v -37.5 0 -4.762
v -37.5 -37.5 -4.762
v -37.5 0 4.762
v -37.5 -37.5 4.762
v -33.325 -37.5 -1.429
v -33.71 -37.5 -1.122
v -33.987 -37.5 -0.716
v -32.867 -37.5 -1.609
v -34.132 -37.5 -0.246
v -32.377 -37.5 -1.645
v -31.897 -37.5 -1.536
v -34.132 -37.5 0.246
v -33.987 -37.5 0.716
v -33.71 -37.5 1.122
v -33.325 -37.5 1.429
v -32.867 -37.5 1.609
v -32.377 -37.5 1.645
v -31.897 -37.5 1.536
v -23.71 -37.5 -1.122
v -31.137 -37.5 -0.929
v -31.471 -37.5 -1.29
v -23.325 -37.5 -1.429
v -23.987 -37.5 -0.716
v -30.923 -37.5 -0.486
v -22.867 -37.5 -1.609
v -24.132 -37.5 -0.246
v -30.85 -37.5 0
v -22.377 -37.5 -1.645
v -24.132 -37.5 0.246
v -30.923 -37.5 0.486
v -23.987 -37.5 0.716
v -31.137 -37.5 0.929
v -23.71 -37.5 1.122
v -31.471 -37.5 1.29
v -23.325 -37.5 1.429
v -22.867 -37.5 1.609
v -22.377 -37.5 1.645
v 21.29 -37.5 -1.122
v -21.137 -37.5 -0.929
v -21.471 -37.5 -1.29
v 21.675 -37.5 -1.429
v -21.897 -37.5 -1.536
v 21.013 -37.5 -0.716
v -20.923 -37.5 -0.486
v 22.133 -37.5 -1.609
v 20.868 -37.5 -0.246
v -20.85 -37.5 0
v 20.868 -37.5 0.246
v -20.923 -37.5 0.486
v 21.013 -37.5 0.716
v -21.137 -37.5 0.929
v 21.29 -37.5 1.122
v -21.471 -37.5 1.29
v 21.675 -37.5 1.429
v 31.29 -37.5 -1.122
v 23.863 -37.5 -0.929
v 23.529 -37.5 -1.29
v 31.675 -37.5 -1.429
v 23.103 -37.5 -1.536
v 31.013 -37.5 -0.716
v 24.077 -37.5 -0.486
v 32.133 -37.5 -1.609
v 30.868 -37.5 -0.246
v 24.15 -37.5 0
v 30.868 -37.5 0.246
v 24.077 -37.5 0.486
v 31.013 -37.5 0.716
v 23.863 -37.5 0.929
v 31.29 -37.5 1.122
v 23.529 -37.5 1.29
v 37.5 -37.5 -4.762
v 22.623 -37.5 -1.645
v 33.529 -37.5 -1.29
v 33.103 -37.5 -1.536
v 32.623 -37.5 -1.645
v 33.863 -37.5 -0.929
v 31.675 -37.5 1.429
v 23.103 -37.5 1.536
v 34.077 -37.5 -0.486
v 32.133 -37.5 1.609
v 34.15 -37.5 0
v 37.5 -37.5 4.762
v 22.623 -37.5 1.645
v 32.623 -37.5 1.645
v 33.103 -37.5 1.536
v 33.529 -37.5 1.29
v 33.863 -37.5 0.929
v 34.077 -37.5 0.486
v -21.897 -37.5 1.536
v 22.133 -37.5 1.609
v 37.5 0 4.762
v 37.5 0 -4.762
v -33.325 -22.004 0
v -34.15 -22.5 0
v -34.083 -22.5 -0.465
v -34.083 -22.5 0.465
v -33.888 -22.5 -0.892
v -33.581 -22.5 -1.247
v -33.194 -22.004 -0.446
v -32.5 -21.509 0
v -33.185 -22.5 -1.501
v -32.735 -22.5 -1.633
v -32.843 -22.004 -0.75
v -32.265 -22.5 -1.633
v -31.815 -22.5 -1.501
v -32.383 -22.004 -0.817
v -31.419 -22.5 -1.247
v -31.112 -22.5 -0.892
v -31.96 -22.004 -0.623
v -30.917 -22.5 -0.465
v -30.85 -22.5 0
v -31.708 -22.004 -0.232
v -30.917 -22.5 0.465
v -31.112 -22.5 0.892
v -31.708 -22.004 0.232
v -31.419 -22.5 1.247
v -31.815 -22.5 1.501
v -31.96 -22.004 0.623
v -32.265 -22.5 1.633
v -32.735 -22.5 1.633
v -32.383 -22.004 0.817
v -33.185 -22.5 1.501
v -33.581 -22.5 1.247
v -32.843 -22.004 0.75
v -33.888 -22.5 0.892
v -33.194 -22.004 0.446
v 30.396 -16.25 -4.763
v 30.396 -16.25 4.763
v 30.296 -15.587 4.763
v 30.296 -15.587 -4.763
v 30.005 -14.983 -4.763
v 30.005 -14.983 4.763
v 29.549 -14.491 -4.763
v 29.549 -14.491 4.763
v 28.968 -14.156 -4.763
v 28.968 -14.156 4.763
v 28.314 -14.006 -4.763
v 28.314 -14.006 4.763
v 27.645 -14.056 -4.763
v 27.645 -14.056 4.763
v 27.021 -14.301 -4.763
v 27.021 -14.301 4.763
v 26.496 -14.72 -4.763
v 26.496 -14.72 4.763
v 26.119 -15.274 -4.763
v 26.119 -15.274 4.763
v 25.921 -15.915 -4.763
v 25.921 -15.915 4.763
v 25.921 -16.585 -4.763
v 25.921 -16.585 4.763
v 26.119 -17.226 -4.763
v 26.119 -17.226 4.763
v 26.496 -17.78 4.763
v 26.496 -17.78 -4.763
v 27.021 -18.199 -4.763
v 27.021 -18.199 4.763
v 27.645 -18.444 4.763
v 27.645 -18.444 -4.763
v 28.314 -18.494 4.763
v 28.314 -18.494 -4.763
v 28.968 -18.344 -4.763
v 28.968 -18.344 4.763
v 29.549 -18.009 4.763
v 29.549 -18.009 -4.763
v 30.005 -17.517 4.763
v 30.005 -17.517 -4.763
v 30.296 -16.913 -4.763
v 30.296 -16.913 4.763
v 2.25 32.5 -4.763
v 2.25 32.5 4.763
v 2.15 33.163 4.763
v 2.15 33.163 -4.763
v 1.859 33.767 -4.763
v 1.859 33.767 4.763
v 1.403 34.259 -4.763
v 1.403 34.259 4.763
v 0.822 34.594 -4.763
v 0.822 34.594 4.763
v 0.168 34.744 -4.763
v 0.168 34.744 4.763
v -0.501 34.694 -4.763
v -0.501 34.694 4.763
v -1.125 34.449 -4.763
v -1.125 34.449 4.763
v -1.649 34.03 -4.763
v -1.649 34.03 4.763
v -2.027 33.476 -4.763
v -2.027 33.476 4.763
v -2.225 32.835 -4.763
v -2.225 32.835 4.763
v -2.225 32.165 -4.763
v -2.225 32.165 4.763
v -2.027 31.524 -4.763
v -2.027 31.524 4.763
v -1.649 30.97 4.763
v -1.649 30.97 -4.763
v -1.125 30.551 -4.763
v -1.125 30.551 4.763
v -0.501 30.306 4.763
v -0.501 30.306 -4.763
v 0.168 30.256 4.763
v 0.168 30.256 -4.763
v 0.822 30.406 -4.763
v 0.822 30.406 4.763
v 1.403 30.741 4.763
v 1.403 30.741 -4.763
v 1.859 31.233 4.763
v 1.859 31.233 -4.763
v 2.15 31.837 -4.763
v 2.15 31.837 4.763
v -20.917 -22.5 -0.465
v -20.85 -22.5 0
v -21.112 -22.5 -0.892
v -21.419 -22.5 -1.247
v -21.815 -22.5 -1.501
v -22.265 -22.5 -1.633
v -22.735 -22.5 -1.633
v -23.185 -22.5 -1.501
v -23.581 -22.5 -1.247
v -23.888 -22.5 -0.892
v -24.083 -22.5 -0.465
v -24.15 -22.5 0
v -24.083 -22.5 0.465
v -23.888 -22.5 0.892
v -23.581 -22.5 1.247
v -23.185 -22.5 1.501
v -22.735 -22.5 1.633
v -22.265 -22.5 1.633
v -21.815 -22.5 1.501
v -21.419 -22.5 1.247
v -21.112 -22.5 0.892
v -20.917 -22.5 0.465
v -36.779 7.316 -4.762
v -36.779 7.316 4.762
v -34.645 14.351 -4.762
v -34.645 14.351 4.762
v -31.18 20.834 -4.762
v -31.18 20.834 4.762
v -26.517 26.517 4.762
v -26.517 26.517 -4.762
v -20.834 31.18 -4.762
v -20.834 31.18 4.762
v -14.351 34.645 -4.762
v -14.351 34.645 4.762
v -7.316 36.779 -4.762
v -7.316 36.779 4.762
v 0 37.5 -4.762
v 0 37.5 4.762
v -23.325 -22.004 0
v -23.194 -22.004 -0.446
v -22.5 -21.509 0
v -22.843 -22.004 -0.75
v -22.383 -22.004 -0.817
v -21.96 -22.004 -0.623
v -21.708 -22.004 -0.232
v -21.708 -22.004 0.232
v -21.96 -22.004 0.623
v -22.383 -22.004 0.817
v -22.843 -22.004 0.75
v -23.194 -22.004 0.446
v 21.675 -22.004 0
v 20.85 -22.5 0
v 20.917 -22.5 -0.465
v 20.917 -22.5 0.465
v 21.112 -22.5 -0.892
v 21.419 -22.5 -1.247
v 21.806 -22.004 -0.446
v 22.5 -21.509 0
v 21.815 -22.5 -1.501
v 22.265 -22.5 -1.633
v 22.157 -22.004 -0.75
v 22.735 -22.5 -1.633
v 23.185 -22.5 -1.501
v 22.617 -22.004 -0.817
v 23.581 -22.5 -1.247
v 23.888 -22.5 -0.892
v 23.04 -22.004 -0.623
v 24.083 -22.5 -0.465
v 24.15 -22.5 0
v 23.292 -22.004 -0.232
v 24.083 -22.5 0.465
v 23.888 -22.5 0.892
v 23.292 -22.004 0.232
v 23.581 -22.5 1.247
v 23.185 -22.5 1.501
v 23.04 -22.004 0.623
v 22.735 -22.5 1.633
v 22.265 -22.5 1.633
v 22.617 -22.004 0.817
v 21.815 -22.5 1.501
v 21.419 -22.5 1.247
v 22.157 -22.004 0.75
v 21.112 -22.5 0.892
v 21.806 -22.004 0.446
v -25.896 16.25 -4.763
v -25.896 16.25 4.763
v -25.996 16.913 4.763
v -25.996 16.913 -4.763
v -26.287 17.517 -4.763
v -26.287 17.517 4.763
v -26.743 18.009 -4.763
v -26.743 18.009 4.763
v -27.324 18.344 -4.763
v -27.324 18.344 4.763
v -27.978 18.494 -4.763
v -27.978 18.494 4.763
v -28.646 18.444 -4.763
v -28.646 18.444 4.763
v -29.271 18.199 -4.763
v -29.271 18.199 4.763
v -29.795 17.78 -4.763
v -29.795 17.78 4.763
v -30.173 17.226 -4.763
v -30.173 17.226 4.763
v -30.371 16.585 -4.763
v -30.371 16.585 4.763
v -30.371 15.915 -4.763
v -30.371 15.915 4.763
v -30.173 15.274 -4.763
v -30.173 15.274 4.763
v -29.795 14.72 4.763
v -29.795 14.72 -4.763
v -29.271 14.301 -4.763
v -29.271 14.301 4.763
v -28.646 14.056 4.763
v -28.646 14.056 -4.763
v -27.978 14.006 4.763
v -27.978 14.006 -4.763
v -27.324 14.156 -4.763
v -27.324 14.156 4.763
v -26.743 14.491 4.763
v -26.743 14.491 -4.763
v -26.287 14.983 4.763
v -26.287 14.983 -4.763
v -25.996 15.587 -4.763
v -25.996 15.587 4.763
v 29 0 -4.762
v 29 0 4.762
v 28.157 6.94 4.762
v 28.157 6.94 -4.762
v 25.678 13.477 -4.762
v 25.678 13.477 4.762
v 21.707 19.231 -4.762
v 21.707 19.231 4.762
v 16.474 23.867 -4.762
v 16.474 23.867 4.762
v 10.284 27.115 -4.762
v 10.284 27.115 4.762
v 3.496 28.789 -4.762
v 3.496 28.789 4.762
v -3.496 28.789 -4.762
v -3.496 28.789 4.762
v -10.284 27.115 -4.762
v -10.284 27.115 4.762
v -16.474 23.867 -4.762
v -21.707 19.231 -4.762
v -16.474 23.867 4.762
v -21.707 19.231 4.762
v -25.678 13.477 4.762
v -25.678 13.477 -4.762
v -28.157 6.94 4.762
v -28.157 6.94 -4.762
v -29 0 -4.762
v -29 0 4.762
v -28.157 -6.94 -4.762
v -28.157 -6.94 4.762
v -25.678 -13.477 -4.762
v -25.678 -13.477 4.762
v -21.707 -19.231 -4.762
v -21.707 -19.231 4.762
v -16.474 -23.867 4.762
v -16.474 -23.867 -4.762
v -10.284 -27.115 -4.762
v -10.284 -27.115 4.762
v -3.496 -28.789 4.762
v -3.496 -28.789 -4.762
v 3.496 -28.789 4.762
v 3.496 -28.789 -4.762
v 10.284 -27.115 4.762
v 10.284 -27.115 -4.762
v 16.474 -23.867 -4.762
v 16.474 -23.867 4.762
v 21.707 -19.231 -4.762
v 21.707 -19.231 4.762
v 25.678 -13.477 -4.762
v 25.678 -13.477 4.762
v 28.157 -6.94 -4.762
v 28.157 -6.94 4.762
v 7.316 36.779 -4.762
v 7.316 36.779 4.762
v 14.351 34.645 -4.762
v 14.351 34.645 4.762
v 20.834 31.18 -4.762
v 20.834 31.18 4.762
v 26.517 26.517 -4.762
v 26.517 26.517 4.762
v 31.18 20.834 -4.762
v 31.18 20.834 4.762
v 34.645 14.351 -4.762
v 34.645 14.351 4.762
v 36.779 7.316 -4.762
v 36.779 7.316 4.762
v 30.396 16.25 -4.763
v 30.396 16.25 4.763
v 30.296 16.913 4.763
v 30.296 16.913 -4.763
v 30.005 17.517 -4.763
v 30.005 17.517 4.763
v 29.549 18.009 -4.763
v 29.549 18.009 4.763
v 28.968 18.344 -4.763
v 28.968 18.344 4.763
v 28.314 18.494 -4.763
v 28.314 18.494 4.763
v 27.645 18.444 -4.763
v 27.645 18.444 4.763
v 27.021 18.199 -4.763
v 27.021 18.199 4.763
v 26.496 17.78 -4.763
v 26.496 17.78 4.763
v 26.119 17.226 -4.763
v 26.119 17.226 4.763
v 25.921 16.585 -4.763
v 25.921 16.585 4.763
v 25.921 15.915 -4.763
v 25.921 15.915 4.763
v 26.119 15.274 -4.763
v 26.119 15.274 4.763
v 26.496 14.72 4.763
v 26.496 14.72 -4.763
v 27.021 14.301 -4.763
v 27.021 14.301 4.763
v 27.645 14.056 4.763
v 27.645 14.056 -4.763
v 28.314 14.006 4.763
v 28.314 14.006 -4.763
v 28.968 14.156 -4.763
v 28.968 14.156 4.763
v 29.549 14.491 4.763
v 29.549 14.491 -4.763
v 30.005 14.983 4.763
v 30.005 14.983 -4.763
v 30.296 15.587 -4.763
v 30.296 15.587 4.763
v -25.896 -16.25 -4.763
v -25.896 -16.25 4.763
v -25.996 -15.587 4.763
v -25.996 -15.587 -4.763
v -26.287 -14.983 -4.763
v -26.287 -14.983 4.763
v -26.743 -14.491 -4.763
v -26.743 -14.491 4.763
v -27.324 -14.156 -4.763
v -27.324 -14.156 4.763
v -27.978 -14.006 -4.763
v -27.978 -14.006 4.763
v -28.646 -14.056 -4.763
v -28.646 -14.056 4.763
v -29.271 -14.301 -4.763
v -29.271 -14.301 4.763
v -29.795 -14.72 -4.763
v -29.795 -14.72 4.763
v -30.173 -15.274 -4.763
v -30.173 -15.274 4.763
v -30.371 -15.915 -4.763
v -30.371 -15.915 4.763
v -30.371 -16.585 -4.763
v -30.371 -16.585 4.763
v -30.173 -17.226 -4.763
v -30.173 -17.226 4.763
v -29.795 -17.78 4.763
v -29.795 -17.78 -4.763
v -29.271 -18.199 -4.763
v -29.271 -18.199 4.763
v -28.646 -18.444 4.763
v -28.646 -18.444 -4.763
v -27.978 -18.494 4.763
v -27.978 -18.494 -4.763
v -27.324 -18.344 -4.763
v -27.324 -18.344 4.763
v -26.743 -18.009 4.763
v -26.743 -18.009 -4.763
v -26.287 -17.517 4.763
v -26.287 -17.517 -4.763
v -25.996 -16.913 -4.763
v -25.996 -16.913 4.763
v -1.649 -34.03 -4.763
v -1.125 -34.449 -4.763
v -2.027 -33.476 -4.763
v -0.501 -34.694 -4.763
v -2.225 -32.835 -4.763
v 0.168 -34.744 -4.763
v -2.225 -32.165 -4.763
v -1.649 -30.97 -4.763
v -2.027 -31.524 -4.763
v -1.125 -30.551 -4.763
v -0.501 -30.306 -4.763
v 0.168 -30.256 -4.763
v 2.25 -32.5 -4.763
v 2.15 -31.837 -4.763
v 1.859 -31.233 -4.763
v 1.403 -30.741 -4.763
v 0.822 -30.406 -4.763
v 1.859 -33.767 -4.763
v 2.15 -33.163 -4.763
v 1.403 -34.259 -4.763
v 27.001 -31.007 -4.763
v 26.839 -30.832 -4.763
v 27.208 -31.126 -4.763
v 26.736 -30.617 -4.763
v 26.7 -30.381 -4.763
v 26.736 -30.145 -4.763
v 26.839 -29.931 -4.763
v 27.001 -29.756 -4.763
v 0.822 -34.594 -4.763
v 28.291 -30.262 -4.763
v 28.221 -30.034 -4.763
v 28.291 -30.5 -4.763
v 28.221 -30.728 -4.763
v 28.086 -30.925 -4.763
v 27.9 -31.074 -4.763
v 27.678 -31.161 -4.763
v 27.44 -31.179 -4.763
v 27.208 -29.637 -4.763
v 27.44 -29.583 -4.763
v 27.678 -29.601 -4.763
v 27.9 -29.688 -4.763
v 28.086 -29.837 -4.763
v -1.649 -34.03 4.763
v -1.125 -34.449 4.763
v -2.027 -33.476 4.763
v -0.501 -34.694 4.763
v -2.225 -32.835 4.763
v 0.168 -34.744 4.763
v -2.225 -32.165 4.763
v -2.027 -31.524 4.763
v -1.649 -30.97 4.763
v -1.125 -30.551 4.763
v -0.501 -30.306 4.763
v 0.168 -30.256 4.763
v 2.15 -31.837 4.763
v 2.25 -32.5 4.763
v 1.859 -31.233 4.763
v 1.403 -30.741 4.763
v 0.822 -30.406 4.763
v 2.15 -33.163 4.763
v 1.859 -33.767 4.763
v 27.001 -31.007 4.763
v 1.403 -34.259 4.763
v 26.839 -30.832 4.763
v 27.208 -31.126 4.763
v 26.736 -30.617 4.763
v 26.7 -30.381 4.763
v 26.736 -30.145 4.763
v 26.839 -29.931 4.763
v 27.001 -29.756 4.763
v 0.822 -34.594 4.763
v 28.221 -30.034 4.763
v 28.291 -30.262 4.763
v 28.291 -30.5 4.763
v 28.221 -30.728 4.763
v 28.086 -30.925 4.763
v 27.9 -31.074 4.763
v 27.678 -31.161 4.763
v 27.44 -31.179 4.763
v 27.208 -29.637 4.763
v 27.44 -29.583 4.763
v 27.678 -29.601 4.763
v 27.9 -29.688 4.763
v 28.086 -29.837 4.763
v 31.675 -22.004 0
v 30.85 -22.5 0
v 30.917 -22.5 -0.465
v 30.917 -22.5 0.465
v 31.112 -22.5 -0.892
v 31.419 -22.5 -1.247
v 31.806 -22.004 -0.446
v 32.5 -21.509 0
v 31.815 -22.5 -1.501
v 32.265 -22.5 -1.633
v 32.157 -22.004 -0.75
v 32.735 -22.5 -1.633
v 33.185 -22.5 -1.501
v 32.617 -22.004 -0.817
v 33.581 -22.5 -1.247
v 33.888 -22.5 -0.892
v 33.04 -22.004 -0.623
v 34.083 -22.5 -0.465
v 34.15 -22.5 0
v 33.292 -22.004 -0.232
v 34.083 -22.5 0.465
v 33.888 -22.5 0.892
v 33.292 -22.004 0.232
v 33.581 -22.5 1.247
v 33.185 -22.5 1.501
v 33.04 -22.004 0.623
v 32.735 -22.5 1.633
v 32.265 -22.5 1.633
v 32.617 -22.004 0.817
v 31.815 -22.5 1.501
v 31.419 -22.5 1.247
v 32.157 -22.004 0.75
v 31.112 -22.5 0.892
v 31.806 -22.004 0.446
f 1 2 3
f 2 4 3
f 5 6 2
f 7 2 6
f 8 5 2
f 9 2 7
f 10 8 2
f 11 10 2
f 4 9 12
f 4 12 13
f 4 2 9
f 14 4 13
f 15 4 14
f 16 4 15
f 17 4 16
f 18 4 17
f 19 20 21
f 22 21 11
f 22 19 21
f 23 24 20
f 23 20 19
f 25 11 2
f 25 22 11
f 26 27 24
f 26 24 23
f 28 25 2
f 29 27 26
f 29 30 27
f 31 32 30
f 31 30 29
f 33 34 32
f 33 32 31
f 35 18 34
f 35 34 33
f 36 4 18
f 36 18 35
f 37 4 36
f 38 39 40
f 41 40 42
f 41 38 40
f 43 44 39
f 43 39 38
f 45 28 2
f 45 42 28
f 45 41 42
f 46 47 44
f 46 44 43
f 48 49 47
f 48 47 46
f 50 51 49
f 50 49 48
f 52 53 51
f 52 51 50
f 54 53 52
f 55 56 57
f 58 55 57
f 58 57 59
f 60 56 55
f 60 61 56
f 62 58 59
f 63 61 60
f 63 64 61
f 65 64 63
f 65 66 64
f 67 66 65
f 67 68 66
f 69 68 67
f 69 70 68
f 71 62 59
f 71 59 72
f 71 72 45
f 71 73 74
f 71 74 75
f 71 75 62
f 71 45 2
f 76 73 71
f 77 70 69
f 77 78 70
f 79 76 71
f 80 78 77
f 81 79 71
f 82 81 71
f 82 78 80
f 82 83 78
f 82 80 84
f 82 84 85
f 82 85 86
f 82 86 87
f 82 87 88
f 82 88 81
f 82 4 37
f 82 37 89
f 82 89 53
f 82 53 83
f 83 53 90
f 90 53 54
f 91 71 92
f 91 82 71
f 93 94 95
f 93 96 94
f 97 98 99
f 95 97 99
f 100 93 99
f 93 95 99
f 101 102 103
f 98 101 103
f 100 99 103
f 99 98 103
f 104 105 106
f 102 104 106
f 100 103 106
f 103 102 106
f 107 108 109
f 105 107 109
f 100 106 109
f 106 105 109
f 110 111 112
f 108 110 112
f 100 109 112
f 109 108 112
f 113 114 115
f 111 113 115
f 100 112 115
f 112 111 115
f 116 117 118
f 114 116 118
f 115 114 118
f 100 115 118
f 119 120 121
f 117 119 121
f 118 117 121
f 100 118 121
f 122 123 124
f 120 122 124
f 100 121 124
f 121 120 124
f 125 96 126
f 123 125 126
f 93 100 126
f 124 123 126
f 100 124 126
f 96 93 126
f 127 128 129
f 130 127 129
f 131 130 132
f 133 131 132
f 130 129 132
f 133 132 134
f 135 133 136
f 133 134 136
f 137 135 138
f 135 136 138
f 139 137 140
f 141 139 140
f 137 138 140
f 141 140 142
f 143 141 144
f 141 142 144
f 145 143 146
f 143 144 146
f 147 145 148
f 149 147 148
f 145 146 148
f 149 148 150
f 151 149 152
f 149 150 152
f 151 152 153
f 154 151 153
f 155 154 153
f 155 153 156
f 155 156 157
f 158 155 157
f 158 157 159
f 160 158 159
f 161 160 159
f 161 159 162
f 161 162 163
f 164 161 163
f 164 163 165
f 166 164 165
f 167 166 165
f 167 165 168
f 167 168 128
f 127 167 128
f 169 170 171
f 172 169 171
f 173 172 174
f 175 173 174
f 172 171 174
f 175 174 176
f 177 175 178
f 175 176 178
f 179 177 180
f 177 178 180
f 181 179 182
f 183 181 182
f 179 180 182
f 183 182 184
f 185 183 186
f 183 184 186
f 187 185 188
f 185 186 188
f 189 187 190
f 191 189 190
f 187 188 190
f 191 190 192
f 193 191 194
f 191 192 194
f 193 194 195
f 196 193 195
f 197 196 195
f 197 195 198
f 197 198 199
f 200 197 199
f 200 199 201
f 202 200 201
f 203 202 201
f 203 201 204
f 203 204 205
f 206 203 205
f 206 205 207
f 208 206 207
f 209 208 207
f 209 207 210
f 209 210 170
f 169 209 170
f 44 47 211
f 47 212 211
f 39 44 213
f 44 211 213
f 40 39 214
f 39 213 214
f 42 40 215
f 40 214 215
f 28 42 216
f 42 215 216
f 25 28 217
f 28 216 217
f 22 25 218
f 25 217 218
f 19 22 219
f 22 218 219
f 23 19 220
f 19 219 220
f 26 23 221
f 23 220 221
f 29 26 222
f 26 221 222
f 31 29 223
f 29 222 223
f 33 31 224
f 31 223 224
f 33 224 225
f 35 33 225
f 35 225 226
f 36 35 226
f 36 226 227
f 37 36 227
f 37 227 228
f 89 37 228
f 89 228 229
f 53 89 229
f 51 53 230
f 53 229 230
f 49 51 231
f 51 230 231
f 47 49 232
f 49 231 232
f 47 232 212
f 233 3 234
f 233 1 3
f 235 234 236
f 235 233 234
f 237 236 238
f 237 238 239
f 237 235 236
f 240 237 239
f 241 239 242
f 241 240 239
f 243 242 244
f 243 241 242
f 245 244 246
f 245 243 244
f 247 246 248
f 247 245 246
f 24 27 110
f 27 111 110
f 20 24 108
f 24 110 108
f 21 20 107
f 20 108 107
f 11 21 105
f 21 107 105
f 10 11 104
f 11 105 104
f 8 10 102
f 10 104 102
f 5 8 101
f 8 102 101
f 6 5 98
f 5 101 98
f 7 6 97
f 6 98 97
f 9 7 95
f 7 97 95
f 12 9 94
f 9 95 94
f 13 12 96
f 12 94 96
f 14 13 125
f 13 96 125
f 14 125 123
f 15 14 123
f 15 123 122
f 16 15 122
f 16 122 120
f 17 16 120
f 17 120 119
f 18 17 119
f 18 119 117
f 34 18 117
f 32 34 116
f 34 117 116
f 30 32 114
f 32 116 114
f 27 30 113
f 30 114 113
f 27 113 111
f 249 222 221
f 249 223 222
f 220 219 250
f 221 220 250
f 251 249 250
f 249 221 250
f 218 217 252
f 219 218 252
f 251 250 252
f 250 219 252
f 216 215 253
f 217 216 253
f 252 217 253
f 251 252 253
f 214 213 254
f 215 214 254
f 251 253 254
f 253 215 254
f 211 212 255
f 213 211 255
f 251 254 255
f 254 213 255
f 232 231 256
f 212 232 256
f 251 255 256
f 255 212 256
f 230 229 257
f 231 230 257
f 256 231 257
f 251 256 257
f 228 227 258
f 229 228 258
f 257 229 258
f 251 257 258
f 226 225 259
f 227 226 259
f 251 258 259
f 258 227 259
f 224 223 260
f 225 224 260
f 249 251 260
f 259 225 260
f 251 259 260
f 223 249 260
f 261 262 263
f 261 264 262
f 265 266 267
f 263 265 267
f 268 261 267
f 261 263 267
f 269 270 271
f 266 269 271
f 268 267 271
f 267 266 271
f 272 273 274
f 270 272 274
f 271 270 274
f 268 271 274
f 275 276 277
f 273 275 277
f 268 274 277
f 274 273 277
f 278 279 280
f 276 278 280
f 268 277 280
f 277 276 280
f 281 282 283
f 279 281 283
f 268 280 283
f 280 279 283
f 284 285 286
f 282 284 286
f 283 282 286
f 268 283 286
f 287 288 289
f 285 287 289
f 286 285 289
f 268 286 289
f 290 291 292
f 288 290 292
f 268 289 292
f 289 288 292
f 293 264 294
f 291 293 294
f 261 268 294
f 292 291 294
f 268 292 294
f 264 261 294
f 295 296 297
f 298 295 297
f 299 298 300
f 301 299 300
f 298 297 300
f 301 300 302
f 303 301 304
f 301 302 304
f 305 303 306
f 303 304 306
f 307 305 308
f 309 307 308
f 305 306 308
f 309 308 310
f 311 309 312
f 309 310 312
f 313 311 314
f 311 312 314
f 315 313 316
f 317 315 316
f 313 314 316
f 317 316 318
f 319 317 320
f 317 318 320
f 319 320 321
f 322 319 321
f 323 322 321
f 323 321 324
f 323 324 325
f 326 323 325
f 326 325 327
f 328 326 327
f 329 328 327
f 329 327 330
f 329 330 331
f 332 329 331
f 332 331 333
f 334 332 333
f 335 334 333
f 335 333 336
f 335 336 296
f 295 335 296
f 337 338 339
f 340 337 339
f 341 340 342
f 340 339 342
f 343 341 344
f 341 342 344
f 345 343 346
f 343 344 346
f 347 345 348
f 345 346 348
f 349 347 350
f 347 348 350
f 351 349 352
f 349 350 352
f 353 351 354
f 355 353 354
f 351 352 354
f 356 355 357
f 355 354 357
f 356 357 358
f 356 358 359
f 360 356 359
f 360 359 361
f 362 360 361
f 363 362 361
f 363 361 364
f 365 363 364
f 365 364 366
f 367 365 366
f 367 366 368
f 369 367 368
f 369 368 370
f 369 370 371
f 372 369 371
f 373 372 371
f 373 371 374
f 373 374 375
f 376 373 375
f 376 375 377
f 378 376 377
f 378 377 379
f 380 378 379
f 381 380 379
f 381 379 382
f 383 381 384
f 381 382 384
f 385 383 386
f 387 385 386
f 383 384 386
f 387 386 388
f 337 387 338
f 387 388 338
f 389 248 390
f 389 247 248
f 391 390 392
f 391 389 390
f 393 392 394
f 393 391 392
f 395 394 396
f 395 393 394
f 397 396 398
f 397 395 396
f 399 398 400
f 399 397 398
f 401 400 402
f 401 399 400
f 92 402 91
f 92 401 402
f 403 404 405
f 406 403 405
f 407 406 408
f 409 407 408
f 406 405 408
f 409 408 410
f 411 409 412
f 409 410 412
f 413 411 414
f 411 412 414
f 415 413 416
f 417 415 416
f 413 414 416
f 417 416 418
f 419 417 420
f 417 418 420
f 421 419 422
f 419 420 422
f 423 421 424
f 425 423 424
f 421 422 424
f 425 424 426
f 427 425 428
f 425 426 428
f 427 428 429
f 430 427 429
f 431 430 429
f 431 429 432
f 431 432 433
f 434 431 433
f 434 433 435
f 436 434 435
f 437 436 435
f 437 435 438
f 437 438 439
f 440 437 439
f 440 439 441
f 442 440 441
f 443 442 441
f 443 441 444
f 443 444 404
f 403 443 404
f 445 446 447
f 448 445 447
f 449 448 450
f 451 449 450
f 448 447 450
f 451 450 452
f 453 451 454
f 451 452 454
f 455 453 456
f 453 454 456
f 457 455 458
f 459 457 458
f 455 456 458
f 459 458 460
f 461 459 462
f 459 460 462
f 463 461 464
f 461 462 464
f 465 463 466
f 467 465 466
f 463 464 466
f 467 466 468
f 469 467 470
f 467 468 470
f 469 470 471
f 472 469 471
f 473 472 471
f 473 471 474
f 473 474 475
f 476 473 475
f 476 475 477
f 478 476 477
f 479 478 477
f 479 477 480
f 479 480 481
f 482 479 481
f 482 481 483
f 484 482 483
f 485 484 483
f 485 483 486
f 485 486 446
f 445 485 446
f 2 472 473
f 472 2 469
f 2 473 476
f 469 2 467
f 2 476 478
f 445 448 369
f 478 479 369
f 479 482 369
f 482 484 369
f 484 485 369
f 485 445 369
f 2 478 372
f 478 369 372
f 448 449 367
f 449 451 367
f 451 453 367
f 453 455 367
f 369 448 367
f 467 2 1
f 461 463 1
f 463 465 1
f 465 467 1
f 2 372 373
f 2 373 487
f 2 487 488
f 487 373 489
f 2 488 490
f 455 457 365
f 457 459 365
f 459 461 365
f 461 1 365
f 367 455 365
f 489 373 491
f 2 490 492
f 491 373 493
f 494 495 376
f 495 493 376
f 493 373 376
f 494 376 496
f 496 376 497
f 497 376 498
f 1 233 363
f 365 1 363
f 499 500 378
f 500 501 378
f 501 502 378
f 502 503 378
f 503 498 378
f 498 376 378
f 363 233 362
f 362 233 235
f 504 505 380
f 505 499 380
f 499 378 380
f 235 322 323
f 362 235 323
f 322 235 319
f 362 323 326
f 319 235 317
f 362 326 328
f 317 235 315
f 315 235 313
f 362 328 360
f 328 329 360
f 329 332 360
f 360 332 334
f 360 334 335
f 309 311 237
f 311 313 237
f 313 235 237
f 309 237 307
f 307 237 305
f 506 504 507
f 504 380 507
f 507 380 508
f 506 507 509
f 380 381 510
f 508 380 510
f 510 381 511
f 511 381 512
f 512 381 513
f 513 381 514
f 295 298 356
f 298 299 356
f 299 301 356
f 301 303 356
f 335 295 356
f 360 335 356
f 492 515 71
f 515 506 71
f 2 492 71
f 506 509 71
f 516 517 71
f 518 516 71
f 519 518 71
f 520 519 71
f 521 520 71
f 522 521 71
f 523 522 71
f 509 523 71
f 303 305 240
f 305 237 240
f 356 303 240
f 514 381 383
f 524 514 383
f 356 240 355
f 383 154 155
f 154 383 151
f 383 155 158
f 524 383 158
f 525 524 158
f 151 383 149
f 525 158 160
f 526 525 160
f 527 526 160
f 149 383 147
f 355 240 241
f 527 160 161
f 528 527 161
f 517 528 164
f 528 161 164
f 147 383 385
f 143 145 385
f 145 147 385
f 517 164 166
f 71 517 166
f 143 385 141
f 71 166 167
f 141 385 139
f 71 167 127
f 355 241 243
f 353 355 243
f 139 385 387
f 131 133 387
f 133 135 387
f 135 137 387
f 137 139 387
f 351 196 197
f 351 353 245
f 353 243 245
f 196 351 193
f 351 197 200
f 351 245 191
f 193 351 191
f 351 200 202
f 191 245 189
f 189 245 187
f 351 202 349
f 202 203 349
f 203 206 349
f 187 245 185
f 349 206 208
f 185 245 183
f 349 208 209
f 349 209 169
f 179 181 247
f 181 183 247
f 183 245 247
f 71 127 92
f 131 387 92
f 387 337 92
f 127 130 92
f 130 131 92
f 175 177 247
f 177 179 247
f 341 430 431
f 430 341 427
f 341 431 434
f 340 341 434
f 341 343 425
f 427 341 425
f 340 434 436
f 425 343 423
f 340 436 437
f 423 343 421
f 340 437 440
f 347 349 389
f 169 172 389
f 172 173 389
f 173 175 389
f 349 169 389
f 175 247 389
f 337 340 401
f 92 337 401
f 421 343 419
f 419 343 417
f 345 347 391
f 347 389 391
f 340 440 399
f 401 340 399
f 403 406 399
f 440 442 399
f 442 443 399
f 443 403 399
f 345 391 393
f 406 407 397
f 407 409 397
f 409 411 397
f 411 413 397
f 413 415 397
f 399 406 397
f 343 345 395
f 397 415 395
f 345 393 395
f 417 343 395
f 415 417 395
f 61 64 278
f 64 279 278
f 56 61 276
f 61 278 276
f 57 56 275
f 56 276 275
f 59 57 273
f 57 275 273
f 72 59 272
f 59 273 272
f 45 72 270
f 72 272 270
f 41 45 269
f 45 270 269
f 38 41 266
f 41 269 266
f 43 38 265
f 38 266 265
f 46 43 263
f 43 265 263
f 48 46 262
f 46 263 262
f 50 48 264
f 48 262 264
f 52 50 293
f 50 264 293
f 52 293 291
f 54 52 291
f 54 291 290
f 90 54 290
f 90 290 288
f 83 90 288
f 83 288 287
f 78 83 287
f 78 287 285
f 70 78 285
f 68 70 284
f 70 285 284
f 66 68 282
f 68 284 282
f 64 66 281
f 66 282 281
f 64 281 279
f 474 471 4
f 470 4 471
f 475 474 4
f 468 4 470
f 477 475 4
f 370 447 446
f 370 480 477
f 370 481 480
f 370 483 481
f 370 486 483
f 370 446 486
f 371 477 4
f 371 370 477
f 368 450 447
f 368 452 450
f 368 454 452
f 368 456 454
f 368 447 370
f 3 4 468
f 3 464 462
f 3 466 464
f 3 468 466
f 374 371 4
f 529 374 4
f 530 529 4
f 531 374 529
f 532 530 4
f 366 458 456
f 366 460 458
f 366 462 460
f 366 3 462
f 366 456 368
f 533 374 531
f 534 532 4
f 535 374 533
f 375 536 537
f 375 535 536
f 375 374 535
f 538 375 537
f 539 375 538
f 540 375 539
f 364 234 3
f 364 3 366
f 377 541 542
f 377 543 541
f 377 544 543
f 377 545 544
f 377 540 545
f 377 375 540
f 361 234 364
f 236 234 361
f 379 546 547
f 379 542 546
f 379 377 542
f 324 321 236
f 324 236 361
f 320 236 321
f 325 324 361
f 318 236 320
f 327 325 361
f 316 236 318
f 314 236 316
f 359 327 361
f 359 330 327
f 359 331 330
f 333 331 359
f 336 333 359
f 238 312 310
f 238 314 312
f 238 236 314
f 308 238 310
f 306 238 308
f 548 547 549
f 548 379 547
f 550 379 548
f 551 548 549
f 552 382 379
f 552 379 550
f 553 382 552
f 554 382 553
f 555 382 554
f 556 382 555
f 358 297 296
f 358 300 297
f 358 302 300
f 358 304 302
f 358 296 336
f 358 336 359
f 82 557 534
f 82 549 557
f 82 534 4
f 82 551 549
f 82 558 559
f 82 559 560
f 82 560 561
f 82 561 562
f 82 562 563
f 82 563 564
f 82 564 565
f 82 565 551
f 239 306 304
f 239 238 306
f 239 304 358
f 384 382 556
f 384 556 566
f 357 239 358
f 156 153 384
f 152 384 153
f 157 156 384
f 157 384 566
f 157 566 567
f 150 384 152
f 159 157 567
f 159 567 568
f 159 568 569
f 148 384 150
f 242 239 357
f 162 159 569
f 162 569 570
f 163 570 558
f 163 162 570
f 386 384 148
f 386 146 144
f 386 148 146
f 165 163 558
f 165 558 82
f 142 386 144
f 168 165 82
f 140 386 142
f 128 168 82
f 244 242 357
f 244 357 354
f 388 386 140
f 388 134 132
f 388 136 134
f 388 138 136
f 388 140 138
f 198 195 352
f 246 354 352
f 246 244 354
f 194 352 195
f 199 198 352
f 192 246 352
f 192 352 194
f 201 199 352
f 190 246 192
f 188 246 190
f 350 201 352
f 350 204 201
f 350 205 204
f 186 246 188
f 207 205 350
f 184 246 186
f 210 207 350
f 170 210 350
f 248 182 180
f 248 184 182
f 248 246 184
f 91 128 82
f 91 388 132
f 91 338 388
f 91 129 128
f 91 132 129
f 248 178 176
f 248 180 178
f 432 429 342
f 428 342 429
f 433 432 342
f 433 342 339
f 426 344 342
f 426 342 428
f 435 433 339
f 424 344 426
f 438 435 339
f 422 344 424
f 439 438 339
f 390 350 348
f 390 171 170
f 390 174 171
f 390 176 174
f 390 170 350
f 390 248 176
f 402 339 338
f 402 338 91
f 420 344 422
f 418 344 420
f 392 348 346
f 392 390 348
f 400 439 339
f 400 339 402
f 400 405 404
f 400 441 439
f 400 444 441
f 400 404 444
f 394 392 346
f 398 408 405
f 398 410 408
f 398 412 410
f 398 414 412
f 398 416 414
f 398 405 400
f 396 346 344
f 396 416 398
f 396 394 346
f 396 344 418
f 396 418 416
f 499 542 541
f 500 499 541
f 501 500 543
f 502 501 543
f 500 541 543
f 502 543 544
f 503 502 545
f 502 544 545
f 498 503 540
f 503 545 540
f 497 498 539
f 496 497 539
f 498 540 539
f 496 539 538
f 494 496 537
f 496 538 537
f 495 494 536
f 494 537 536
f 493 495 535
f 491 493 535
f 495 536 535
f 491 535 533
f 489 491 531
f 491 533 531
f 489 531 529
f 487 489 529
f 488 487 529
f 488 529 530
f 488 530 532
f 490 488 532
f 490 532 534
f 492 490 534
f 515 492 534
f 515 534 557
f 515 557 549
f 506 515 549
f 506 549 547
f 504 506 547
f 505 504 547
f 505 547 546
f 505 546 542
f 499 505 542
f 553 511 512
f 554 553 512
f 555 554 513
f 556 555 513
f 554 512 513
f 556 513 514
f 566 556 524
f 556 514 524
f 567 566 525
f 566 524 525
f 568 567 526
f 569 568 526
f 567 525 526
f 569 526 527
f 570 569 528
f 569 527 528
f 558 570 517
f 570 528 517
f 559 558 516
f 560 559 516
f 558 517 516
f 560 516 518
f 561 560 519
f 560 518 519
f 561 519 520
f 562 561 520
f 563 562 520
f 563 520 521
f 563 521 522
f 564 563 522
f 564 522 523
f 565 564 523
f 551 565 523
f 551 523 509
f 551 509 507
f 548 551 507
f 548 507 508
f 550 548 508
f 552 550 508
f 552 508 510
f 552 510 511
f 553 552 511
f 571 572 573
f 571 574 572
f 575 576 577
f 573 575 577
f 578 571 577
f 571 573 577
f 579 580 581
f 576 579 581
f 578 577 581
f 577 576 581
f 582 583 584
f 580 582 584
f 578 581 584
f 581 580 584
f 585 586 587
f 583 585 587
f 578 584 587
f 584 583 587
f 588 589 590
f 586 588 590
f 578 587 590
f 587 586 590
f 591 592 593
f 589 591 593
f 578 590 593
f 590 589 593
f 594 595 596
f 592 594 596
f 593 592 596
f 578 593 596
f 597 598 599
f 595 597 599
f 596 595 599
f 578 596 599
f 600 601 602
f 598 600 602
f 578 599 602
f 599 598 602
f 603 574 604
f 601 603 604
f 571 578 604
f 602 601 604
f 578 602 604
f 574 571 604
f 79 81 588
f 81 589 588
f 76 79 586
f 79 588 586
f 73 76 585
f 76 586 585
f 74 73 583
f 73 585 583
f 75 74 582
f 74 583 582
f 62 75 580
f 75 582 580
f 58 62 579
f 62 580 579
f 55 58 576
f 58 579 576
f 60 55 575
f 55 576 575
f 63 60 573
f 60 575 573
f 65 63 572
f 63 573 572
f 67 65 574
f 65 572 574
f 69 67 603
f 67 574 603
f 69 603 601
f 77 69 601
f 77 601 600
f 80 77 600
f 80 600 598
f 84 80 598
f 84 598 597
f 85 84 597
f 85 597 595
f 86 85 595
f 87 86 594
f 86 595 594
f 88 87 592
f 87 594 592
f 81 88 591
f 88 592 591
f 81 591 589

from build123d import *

# Parameters (mm, degrees)
SKETCH2_W                 = 75
SKETCH2_H                 = 75
BOSS_EXTRUDE1_DEPTH       = 4.7625
M4X0_7_TAPPED_HOLE1_D     = 3.3
M4X0_7_TAPPED_HOLE1_DEPTH = 15
M4X0_7_TAPPED_HOLE1_TIP   = 0.991420021
SKETCH6_R                 = 29
CUT_EXTRUDE1_DEPTH        = 54.881588924
M4_CLEARANCE_HOLE1_D      = 4.5
FILLET1_R                 = 37.5
M2X0_4_TAPPED_HOLE1_D     = 1.6


with BuildPart() as part:
    # Sketch2 → Boss-Extrude1 (new, symmetric)
    with BuildSketch(Plane.XY):
        Rectangle(SKETCH2_W, SKETCH2_H)
    extrude(amount=BOSS_EXTRUDE1_DEPTH, both=True)

    # M4x0.7 Tapped Hole1
    with Locations(Plane(origin=(0, -37.5, 0), x_dir=(-1, 0, 0), z_dir=(0, -1, 0))):
        with Locations((-32.5, 0), (-22.5, 0), (22.5, 0), (32.5, 0)):
            Hole(M4X0_7_TAPPED_HOLE1_D / 2, depth=M4X0_7_TAPPED_HOLE1_DEPTH)
            with Locations((0, 0, -(M4X0_7_TAPPED_HOLE1_DEPTH + M4X0_7_TAPPED_HOLE1_TIP / 2))):  # 118° drill point
                Cone(0, M4X0_7_TAPPED_HOLE1_D / 2, M4X0_7_TAPPED_HOLE1_TIP, mode=Mode.SUBTRACT)

    # Sketch6 → Cut-Extrude1 (cut, through all)
    with BuildSketch(Plane.XY.offset(4.7625)):
        Circle(SKETCH6_R)
    extrude(amount=-CUT_EXTRUDE1_DEPTH, mode=Mode.SUBTRACT)

    # M4 Clearance Hole1 (through all)
    with Locations(Plane(origin=(0, 0, -4.7625), x_dir=(-1, 0, 0), z_dir=(0, 0, -1))):
        with Locations((0, 32.5), (28.145825623, 16.25), (-28.145825623, 16.25), (-28.145825623, -16.25), (0, -32.5), (28.145825623, -16.25)):
            Hole(M4_CLEARANCE_HOLE1_D / 2)

    # Fillet1
    fillet1_edges = [part.edges().sort_by_distance(p)[0] for p in [
        (-37.5, 37.5, 0),
        (37.5, 37.5, 0),
    ]]
    fillet(fillet1_edges, radius=FILLET1_R - 0.0001)  # a hair under: the kernel refuses the full size

    # M2x0.4 Tapped Hole1 (through all)
    with Locations(Plane.XY.offset(4.7625)):
        with Locations((27.5, -30.38125)):
            Hole(M2X0_4_TAPPED_HOLE1_D / 2)


solid = part.part
